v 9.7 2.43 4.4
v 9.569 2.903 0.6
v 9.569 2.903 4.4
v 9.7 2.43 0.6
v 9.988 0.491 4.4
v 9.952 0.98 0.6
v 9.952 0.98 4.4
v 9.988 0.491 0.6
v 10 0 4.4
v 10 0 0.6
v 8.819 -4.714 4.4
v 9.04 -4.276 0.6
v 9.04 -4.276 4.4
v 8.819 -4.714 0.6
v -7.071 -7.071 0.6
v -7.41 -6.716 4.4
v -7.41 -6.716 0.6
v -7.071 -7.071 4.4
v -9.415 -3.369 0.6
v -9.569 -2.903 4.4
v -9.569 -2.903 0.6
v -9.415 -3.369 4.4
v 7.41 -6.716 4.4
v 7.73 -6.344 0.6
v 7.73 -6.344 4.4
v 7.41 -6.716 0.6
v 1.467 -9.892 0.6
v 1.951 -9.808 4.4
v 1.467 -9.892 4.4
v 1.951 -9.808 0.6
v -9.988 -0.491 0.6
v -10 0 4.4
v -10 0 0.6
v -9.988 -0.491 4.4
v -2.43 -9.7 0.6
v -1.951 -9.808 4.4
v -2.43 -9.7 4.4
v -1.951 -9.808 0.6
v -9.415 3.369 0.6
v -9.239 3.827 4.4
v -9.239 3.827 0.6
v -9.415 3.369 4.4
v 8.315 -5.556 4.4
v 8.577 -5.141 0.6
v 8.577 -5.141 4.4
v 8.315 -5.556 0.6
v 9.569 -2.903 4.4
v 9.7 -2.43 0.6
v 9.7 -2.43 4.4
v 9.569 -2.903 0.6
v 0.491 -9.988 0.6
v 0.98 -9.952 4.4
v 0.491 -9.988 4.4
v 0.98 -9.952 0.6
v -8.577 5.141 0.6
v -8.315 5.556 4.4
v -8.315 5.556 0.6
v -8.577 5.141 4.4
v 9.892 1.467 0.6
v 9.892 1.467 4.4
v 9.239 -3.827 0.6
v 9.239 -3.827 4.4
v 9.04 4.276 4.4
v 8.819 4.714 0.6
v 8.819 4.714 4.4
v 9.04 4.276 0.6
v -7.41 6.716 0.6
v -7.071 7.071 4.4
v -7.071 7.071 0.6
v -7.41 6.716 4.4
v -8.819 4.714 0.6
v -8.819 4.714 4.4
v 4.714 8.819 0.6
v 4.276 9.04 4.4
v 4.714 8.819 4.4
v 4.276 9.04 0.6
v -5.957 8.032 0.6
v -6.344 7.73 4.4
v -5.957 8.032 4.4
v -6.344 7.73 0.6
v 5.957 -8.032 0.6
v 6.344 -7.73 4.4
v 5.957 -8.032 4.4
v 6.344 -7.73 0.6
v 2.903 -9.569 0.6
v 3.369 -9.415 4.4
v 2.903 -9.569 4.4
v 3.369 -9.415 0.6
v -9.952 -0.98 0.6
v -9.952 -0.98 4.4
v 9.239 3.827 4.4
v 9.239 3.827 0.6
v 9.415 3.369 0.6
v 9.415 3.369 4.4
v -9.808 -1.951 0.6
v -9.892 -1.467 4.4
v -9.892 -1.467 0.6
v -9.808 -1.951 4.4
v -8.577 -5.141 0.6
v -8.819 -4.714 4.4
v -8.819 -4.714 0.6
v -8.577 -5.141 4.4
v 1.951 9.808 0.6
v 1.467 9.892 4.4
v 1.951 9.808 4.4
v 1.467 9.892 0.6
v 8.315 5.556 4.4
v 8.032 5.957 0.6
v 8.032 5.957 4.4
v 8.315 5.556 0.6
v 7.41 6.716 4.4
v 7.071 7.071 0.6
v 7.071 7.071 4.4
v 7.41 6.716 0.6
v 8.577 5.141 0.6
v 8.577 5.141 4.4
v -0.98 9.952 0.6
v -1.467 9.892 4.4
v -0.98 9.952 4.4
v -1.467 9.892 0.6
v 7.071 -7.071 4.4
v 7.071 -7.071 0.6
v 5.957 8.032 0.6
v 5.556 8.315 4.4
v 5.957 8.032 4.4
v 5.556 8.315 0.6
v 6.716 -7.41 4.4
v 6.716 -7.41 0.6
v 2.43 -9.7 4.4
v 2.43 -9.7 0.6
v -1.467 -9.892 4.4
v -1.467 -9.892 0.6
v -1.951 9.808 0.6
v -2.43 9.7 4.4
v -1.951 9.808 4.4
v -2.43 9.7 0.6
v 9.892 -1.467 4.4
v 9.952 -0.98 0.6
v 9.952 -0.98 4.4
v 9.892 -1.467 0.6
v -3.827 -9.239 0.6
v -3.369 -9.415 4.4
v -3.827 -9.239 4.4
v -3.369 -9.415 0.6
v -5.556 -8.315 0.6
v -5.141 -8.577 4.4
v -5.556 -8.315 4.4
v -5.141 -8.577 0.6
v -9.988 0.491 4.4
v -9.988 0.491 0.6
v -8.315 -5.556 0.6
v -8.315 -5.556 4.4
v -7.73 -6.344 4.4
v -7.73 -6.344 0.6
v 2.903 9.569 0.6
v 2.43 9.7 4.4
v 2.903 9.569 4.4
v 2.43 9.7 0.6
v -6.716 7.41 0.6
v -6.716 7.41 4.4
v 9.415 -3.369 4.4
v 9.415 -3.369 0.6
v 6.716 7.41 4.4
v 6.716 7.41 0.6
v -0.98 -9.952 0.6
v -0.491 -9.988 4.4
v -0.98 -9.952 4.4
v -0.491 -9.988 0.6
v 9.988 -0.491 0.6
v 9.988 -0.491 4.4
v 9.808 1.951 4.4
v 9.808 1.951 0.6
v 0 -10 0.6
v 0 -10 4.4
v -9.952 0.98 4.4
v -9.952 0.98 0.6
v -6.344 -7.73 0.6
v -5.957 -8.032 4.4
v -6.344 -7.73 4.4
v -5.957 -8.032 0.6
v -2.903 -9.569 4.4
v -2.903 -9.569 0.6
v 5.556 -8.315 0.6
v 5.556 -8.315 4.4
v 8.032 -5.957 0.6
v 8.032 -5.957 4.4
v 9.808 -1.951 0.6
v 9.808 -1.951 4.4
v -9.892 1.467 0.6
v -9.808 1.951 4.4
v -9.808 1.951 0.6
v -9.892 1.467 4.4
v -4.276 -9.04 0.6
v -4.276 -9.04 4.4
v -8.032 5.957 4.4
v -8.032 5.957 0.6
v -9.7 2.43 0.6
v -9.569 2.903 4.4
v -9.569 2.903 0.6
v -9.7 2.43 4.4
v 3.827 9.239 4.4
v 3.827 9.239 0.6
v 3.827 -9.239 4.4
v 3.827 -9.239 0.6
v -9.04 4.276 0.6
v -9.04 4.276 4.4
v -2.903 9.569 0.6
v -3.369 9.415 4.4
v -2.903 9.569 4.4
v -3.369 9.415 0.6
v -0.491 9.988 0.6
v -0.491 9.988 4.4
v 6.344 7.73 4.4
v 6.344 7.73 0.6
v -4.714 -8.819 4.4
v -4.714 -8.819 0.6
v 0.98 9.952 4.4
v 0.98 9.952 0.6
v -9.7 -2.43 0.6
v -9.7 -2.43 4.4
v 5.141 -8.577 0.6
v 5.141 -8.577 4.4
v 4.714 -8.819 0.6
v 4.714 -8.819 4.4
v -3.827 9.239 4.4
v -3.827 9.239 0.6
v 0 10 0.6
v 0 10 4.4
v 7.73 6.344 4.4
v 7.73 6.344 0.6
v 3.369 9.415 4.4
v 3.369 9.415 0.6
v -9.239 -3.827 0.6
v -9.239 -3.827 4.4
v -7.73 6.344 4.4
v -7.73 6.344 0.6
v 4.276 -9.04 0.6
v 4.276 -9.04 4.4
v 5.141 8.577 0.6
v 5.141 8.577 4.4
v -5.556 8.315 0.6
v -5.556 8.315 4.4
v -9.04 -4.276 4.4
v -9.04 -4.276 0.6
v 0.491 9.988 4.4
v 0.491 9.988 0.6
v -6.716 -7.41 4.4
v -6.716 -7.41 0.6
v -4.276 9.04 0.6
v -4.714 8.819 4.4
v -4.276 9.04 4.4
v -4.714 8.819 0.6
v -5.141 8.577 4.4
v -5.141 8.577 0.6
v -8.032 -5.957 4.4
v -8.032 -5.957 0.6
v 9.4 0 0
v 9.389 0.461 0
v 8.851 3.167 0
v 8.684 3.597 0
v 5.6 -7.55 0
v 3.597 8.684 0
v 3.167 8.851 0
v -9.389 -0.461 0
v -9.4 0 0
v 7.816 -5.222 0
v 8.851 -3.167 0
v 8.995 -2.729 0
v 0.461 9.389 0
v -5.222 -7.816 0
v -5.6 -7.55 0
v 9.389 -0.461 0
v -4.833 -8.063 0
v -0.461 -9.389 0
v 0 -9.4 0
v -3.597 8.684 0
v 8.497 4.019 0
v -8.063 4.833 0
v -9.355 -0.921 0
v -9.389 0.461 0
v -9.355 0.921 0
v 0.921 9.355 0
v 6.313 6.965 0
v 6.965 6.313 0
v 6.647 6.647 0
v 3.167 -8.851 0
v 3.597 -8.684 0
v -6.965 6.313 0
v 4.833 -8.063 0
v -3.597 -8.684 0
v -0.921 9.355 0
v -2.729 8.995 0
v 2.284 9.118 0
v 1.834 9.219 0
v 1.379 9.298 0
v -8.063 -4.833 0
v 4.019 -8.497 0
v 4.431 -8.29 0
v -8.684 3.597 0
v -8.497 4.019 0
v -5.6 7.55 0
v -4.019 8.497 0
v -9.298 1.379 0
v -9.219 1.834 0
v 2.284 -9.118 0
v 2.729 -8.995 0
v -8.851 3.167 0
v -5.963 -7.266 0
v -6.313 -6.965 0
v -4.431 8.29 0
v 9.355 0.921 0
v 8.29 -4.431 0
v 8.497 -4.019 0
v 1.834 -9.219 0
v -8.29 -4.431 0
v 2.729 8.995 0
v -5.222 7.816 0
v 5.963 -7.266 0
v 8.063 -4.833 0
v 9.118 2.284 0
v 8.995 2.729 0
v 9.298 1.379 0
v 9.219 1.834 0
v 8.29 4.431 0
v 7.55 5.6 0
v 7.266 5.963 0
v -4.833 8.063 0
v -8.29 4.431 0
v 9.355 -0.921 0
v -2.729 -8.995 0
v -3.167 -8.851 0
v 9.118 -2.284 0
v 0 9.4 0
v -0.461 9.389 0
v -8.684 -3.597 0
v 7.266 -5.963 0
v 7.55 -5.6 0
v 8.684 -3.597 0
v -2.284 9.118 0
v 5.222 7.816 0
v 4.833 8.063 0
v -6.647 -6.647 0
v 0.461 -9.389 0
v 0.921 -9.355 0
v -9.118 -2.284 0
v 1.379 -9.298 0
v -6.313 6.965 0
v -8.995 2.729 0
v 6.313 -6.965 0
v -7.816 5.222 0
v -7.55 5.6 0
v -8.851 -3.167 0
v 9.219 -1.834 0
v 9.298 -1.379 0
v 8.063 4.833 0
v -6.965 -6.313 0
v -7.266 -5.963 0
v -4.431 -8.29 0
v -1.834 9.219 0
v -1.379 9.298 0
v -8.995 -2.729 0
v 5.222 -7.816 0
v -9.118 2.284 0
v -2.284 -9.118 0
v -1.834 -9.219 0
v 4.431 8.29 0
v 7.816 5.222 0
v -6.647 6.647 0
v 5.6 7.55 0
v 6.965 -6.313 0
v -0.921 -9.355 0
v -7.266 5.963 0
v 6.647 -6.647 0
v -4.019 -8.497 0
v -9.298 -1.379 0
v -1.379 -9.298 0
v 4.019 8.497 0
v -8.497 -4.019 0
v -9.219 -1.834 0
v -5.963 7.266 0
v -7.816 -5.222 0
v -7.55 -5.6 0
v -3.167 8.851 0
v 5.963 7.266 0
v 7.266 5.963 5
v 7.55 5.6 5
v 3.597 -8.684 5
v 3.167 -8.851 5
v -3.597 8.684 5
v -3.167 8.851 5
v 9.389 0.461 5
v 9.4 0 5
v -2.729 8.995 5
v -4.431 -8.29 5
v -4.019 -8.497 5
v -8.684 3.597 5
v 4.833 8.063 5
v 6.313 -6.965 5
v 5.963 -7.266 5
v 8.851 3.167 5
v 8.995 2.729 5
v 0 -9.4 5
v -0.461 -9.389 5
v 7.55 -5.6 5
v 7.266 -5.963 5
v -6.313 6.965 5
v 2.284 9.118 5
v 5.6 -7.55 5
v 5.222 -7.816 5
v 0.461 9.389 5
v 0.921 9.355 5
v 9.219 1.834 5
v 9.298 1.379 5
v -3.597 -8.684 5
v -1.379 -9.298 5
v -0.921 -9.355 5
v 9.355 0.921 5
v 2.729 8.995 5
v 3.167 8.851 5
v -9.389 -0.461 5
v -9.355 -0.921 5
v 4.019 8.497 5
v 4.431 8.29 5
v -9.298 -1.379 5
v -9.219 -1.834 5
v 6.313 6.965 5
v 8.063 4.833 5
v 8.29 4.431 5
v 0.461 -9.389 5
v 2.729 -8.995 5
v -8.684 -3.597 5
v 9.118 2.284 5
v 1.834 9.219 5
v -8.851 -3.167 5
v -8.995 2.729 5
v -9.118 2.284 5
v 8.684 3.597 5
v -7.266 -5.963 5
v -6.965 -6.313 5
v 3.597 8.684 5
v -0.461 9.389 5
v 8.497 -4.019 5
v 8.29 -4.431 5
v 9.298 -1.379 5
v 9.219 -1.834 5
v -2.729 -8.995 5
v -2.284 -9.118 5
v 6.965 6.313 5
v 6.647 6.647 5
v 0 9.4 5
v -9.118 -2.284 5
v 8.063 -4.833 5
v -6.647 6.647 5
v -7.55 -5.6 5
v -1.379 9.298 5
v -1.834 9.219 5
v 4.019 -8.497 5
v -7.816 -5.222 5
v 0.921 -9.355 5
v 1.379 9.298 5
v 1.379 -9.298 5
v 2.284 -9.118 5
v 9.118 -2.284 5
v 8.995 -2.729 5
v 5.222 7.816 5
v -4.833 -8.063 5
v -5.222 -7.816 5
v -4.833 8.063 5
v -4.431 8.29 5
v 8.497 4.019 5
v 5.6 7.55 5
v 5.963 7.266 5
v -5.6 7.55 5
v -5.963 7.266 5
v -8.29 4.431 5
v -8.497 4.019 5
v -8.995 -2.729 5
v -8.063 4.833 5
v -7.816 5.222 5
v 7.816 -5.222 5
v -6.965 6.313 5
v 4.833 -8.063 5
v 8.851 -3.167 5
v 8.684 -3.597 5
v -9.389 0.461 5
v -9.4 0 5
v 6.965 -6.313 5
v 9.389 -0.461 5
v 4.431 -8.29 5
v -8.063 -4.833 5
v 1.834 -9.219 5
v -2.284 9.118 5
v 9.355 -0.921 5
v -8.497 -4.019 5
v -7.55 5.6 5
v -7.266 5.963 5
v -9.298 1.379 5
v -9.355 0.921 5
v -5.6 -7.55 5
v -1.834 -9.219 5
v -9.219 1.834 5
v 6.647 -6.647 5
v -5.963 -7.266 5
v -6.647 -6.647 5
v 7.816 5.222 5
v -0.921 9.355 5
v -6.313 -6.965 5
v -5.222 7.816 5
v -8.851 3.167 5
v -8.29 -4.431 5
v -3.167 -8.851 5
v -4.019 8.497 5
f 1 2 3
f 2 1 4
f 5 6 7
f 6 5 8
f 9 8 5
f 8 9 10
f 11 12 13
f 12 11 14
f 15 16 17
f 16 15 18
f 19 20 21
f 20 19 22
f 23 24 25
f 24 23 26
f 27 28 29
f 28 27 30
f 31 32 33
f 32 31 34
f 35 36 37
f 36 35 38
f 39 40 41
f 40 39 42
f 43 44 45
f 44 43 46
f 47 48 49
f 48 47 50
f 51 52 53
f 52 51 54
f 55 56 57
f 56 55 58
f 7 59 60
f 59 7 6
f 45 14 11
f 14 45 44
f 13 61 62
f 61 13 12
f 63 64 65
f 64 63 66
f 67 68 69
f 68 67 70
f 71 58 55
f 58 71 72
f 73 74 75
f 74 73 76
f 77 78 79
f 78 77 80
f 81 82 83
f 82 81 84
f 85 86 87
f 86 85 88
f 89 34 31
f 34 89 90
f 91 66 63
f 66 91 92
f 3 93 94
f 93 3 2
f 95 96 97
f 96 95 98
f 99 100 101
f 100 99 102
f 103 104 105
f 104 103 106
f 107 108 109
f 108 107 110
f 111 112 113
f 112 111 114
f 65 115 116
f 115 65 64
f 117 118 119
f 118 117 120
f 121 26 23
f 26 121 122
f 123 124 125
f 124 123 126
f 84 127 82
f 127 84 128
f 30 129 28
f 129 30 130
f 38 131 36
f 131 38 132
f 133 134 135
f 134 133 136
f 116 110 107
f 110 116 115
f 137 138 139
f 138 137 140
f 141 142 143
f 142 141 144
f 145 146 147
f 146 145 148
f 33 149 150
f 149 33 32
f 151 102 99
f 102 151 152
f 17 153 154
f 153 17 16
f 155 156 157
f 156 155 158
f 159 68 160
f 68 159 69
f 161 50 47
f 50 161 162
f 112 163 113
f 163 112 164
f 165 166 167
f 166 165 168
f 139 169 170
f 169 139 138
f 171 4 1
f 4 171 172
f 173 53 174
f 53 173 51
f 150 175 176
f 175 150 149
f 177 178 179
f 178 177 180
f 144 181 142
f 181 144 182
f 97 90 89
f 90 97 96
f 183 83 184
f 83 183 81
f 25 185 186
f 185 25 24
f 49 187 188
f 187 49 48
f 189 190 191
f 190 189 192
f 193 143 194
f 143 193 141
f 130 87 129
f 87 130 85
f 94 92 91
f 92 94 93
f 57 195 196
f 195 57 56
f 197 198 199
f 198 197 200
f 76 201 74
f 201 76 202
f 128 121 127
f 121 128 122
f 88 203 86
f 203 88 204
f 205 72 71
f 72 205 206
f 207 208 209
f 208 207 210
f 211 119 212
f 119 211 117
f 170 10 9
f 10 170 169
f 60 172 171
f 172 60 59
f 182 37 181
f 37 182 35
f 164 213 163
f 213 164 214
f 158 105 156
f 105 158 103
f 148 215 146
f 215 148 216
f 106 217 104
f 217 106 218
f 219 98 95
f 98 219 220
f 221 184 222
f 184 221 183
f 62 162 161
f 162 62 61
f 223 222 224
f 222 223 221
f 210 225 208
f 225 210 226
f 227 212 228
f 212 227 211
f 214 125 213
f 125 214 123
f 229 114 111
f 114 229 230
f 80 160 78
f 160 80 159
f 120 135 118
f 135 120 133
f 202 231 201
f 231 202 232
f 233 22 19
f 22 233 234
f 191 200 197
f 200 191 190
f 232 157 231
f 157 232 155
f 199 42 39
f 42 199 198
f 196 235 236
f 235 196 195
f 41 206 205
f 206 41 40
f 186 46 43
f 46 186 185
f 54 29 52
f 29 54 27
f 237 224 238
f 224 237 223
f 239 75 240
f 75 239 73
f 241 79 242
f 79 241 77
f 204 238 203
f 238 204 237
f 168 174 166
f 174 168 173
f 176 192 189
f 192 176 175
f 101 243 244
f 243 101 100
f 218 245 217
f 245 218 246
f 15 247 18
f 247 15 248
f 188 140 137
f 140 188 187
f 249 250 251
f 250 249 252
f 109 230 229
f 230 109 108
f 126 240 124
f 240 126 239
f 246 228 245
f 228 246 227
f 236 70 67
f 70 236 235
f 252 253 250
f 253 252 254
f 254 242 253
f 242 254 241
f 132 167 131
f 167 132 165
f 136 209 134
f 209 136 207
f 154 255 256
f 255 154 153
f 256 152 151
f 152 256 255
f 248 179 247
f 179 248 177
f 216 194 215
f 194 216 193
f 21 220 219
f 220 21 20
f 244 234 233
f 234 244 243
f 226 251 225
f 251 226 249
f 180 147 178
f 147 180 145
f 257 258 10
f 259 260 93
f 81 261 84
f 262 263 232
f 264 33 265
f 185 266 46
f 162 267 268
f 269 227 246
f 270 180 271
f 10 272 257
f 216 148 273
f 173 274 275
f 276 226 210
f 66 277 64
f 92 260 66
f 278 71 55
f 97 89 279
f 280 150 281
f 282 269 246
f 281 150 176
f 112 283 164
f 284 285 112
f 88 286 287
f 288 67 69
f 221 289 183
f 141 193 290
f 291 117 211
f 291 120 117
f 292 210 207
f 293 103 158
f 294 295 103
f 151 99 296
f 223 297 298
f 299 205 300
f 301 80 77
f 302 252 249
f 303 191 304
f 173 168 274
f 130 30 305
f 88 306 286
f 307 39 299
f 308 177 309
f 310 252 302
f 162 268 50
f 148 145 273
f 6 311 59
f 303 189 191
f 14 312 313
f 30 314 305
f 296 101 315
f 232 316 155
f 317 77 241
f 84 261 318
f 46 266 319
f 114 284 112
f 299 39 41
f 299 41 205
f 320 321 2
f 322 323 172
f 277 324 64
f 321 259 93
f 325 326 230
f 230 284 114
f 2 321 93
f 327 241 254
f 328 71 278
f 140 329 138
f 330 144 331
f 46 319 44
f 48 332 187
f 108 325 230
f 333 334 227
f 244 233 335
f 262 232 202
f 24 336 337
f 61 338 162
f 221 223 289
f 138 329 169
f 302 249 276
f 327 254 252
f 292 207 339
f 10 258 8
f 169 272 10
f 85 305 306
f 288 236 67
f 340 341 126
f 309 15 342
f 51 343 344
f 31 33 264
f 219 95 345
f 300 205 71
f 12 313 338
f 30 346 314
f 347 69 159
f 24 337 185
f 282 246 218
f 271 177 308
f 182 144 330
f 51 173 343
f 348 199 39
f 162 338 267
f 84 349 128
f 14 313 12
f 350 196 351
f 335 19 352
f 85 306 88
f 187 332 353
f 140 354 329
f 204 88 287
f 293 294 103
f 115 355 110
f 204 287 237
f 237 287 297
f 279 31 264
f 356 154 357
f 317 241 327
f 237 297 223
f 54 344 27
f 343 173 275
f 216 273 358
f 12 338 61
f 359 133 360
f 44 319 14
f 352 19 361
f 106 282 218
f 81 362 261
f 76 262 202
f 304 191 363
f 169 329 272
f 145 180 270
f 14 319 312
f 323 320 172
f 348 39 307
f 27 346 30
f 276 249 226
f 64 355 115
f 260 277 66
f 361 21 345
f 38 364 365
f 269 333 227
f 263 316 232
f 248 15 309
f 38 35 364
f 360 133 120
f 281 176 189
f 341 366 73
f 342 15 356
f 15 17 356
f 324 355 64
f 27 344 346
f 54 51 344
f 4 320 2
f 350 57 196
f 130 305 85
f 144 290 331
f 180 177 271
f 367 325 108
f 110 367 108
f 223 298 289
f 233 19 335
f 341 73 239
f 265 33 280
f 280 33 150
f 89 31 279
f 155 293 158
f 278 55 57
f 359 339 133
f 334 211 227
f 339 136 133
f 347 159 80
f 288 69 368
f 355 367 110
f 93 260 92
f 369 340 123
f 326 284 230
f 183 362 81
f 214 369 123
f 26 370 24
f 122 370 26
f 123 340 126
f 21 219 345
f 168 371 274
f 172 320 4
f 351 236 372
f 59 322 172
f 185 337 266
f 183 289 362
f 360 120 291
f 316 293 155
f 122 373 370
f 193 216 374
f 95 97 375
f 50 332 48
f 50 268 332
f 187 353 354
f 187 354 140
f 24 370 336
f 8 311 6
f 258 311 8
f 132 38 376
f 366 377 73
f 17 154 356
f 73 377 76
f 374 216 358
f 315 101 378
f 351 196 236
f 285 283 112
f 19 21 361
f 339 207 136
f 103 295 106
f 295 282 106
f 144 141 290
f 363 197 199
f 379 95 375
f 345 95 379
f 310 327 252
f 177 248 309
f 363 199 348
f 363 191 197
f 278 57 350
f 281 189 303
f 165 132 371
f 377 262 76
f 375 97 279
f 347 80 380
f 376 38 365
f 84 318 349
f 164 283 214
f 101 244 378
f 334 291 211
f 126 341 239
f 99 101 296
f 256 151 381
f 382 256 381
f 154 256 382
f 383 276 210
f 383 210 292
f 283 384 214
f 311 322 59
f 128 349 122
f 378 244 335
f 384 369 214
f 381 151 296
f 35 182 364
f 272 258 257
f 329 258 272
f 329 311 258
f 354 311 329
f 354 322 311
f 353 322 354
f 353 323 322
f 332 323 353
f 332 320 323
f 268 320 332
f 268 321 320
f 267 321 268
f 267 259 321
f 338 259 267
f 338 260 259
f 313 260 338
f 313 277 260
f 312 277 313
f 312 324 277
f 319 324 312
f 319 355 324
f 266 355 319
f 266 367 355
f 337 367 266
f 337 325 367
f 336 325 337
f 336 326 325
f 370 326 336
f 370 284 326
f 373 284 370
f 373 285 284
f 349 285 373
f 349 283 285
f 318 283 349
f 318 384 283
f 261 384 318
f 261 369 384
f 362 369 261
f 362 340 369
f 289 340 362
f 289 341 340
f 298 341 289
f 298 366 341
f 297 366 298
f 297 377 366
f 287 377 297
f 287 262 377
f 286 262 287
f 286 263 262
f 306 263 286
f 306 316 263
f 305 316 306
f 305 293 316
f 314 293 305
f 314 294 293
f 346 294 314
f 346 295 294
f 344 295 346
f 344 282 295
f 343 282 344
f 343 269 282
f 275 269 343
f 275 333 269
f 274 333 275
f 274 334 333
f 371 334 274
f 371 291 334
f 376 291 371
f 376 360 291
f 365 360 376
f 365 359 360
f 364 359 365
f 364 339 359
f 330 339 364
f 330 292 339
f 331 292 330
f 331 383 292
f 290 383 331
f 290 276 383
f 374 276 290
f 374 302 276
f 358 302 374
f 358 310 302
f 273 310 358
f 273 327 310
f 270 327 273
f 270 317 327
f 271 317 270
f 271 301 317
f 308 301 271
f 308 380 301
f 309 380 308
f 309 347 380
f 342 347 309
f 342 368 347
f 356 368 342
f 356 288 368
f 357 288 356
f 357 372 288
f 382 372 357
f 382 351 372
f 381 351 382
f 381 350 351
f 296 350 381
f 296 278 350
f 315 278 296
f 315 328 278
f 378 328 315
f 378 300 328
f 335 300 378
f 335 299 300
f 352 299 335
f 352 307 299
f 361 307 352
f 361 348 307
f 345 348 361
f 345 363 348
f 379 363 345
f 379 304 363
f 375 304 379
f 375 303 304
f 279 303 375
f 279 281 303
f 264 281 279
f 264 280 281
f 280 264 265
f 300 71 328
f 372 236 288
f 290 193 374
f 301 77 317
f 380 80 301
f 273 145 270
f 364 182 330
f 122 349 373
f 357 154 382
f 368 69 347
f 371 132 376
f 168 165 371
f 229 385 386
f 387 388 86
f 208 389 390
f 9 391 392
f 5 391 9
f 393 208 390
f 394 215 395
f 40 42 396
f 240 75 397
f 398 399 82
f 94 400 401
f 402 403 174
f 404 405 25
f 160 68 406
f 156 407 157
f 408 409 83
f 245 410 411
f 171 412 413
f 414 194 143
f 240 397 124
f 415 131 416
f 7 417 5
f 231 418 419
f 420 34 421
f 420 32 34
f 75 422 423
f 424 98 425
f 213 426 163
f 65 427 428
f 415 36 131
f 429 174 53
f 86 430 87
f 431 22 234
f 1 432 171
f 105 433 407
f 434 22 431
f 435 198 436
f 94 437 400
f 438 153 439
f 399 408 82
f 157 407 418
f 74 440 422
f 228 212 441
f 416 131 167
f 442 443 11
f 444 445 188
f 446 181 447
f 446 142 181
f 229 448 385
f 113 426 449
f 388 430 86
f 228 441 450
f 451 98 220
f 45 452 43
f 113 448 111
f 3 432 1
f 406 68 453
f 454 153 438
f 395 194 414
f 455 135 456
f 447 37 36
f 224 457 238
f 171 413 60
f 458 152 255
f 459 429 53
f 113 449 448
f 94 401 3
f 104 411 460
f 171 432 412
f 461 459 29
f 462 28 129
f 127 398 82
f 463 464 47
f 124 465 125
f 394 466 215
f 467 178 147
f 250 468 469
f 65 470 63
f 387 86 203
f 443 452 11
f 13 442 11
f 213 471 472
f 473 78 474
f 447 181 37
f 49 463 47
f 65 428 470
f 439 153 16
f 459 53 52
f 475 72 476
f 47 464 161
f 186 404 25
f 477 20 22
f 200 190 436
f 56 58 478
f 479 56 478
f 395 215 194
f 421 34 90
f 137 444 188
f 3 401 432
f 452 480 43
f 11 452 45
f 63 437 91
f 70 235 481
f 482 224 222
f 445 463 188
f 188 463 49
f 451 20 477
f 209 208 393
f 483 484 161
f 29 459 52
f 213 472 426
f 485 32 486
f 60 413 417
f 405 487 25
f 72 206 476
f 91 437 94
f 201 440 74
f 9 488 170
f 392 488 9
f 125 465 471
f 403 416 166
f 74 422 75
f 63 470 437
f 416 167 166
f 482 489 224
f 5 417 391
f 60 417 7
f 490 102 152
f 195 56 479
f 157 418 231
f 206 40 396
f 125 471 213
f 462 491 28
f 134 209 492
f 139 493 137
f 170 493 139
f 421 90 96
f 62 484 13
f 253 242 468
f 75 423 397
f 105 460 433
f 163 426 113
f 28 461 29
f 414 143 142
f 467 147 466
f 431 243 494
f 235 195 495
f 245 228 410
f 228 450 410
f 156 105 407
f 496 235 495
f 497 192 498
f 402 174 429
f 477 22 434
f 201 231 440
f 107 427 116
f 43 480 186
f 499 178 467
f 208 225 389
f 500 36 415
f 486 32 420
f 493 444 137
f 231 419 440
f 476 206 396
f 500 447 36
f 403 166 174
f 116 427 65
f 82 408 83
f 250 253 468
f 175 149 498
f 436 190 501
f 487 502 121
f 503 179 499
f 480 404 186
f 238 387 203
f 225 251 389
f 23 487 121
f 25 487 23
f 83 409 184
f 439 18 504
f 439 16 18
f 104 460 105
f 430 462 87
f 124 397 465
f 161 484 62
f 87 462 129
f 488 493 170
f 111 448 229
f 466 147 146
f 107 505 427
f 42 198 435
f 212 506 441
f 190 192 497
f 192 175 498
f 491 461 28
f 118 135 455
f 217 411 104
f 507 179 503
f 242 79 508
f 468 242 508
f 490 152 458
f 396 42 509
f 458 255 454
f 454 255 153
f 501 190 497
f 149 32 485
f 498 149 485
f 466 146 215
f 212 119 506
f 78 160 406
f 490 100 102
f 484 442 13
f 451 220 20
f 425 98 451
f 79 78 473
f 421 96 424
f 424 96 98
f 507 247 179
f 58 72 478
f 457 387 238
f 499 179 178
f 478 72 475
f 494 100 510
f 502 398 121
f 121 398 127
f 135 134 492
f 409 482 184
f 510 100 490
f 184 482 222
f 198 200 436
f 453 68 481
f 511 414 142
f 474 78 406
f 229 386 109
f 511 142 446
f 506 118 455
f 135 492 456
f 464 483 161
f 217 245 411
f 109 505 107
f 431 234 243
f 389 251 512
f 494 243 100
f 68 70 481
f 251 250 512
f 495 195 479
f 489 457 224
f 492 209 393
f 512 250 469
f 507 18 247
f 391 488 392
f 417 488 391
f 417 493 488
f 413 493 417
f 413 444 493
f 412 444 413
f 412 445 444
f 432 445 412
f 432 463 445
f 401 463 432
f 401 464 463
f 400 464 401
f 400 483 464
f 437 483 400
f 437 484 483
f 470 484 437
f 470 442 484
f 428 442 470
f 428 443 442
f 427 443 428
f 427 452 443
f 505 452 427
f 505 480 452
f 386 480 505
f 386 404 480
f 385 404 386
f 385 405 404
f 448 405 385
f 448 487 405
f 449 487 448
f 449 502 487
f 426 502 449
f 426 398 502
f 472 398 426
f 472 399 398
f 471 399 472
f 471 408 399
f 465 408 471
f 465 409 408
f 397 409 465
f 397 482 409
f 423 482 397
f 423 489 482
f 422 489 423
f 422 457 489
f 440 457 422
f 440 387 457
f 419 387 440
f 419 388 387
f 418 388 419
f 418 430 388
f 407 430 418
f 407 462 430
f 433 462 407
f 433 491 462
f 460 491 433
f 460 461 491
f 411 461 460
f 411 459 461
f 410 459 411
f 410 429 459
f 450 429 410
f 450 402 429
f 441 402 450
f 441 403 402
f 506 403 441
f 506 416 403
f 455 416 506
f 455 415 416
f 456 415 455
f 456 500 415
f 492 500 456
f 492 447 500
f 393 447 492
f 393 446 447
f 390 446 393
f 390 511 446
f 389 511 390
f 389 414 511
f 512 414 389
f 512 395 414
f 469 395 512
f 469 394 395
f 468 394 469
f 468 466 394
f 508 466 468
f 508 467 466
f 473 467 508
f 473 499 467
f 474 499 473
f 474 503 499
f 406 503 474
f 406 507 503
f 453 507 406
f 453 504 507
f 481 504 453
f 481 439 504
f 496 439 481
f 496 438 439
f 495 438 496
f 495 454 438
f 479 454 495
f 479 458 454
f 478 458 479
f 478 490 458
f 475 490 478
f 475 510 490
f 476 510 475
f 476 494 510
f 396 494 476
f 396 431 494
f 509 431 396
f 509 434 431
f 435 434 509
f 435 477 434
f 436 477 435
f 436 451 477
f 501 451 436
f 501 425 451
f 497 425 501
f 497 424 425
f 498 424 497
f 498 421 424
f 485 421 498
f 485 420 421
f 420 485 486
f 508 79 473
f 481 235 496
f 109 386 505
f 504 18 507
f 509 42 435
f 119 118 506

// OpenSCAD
$fn = 128;

magnet_d = 20;
magnet_h = 5;
edge_chamfer = 0.6;

module chamfered_cylinder(d=20, h=5, c=0.6) {
    c = min(c, h/2, d/4);
    union() {
        translate([0,0,c])
            cylinder(d=d, h=h-2*c);
        cylinder(d1=d-2*c, d2=d, h=c);
        translate([0,0,h-c])
            cylinder(d1=d, d2=d-2*c, h=c);
    }
}

chamfered_cylinder(d=magnet_d, h=magnet_h, c=edge_chamfer);
